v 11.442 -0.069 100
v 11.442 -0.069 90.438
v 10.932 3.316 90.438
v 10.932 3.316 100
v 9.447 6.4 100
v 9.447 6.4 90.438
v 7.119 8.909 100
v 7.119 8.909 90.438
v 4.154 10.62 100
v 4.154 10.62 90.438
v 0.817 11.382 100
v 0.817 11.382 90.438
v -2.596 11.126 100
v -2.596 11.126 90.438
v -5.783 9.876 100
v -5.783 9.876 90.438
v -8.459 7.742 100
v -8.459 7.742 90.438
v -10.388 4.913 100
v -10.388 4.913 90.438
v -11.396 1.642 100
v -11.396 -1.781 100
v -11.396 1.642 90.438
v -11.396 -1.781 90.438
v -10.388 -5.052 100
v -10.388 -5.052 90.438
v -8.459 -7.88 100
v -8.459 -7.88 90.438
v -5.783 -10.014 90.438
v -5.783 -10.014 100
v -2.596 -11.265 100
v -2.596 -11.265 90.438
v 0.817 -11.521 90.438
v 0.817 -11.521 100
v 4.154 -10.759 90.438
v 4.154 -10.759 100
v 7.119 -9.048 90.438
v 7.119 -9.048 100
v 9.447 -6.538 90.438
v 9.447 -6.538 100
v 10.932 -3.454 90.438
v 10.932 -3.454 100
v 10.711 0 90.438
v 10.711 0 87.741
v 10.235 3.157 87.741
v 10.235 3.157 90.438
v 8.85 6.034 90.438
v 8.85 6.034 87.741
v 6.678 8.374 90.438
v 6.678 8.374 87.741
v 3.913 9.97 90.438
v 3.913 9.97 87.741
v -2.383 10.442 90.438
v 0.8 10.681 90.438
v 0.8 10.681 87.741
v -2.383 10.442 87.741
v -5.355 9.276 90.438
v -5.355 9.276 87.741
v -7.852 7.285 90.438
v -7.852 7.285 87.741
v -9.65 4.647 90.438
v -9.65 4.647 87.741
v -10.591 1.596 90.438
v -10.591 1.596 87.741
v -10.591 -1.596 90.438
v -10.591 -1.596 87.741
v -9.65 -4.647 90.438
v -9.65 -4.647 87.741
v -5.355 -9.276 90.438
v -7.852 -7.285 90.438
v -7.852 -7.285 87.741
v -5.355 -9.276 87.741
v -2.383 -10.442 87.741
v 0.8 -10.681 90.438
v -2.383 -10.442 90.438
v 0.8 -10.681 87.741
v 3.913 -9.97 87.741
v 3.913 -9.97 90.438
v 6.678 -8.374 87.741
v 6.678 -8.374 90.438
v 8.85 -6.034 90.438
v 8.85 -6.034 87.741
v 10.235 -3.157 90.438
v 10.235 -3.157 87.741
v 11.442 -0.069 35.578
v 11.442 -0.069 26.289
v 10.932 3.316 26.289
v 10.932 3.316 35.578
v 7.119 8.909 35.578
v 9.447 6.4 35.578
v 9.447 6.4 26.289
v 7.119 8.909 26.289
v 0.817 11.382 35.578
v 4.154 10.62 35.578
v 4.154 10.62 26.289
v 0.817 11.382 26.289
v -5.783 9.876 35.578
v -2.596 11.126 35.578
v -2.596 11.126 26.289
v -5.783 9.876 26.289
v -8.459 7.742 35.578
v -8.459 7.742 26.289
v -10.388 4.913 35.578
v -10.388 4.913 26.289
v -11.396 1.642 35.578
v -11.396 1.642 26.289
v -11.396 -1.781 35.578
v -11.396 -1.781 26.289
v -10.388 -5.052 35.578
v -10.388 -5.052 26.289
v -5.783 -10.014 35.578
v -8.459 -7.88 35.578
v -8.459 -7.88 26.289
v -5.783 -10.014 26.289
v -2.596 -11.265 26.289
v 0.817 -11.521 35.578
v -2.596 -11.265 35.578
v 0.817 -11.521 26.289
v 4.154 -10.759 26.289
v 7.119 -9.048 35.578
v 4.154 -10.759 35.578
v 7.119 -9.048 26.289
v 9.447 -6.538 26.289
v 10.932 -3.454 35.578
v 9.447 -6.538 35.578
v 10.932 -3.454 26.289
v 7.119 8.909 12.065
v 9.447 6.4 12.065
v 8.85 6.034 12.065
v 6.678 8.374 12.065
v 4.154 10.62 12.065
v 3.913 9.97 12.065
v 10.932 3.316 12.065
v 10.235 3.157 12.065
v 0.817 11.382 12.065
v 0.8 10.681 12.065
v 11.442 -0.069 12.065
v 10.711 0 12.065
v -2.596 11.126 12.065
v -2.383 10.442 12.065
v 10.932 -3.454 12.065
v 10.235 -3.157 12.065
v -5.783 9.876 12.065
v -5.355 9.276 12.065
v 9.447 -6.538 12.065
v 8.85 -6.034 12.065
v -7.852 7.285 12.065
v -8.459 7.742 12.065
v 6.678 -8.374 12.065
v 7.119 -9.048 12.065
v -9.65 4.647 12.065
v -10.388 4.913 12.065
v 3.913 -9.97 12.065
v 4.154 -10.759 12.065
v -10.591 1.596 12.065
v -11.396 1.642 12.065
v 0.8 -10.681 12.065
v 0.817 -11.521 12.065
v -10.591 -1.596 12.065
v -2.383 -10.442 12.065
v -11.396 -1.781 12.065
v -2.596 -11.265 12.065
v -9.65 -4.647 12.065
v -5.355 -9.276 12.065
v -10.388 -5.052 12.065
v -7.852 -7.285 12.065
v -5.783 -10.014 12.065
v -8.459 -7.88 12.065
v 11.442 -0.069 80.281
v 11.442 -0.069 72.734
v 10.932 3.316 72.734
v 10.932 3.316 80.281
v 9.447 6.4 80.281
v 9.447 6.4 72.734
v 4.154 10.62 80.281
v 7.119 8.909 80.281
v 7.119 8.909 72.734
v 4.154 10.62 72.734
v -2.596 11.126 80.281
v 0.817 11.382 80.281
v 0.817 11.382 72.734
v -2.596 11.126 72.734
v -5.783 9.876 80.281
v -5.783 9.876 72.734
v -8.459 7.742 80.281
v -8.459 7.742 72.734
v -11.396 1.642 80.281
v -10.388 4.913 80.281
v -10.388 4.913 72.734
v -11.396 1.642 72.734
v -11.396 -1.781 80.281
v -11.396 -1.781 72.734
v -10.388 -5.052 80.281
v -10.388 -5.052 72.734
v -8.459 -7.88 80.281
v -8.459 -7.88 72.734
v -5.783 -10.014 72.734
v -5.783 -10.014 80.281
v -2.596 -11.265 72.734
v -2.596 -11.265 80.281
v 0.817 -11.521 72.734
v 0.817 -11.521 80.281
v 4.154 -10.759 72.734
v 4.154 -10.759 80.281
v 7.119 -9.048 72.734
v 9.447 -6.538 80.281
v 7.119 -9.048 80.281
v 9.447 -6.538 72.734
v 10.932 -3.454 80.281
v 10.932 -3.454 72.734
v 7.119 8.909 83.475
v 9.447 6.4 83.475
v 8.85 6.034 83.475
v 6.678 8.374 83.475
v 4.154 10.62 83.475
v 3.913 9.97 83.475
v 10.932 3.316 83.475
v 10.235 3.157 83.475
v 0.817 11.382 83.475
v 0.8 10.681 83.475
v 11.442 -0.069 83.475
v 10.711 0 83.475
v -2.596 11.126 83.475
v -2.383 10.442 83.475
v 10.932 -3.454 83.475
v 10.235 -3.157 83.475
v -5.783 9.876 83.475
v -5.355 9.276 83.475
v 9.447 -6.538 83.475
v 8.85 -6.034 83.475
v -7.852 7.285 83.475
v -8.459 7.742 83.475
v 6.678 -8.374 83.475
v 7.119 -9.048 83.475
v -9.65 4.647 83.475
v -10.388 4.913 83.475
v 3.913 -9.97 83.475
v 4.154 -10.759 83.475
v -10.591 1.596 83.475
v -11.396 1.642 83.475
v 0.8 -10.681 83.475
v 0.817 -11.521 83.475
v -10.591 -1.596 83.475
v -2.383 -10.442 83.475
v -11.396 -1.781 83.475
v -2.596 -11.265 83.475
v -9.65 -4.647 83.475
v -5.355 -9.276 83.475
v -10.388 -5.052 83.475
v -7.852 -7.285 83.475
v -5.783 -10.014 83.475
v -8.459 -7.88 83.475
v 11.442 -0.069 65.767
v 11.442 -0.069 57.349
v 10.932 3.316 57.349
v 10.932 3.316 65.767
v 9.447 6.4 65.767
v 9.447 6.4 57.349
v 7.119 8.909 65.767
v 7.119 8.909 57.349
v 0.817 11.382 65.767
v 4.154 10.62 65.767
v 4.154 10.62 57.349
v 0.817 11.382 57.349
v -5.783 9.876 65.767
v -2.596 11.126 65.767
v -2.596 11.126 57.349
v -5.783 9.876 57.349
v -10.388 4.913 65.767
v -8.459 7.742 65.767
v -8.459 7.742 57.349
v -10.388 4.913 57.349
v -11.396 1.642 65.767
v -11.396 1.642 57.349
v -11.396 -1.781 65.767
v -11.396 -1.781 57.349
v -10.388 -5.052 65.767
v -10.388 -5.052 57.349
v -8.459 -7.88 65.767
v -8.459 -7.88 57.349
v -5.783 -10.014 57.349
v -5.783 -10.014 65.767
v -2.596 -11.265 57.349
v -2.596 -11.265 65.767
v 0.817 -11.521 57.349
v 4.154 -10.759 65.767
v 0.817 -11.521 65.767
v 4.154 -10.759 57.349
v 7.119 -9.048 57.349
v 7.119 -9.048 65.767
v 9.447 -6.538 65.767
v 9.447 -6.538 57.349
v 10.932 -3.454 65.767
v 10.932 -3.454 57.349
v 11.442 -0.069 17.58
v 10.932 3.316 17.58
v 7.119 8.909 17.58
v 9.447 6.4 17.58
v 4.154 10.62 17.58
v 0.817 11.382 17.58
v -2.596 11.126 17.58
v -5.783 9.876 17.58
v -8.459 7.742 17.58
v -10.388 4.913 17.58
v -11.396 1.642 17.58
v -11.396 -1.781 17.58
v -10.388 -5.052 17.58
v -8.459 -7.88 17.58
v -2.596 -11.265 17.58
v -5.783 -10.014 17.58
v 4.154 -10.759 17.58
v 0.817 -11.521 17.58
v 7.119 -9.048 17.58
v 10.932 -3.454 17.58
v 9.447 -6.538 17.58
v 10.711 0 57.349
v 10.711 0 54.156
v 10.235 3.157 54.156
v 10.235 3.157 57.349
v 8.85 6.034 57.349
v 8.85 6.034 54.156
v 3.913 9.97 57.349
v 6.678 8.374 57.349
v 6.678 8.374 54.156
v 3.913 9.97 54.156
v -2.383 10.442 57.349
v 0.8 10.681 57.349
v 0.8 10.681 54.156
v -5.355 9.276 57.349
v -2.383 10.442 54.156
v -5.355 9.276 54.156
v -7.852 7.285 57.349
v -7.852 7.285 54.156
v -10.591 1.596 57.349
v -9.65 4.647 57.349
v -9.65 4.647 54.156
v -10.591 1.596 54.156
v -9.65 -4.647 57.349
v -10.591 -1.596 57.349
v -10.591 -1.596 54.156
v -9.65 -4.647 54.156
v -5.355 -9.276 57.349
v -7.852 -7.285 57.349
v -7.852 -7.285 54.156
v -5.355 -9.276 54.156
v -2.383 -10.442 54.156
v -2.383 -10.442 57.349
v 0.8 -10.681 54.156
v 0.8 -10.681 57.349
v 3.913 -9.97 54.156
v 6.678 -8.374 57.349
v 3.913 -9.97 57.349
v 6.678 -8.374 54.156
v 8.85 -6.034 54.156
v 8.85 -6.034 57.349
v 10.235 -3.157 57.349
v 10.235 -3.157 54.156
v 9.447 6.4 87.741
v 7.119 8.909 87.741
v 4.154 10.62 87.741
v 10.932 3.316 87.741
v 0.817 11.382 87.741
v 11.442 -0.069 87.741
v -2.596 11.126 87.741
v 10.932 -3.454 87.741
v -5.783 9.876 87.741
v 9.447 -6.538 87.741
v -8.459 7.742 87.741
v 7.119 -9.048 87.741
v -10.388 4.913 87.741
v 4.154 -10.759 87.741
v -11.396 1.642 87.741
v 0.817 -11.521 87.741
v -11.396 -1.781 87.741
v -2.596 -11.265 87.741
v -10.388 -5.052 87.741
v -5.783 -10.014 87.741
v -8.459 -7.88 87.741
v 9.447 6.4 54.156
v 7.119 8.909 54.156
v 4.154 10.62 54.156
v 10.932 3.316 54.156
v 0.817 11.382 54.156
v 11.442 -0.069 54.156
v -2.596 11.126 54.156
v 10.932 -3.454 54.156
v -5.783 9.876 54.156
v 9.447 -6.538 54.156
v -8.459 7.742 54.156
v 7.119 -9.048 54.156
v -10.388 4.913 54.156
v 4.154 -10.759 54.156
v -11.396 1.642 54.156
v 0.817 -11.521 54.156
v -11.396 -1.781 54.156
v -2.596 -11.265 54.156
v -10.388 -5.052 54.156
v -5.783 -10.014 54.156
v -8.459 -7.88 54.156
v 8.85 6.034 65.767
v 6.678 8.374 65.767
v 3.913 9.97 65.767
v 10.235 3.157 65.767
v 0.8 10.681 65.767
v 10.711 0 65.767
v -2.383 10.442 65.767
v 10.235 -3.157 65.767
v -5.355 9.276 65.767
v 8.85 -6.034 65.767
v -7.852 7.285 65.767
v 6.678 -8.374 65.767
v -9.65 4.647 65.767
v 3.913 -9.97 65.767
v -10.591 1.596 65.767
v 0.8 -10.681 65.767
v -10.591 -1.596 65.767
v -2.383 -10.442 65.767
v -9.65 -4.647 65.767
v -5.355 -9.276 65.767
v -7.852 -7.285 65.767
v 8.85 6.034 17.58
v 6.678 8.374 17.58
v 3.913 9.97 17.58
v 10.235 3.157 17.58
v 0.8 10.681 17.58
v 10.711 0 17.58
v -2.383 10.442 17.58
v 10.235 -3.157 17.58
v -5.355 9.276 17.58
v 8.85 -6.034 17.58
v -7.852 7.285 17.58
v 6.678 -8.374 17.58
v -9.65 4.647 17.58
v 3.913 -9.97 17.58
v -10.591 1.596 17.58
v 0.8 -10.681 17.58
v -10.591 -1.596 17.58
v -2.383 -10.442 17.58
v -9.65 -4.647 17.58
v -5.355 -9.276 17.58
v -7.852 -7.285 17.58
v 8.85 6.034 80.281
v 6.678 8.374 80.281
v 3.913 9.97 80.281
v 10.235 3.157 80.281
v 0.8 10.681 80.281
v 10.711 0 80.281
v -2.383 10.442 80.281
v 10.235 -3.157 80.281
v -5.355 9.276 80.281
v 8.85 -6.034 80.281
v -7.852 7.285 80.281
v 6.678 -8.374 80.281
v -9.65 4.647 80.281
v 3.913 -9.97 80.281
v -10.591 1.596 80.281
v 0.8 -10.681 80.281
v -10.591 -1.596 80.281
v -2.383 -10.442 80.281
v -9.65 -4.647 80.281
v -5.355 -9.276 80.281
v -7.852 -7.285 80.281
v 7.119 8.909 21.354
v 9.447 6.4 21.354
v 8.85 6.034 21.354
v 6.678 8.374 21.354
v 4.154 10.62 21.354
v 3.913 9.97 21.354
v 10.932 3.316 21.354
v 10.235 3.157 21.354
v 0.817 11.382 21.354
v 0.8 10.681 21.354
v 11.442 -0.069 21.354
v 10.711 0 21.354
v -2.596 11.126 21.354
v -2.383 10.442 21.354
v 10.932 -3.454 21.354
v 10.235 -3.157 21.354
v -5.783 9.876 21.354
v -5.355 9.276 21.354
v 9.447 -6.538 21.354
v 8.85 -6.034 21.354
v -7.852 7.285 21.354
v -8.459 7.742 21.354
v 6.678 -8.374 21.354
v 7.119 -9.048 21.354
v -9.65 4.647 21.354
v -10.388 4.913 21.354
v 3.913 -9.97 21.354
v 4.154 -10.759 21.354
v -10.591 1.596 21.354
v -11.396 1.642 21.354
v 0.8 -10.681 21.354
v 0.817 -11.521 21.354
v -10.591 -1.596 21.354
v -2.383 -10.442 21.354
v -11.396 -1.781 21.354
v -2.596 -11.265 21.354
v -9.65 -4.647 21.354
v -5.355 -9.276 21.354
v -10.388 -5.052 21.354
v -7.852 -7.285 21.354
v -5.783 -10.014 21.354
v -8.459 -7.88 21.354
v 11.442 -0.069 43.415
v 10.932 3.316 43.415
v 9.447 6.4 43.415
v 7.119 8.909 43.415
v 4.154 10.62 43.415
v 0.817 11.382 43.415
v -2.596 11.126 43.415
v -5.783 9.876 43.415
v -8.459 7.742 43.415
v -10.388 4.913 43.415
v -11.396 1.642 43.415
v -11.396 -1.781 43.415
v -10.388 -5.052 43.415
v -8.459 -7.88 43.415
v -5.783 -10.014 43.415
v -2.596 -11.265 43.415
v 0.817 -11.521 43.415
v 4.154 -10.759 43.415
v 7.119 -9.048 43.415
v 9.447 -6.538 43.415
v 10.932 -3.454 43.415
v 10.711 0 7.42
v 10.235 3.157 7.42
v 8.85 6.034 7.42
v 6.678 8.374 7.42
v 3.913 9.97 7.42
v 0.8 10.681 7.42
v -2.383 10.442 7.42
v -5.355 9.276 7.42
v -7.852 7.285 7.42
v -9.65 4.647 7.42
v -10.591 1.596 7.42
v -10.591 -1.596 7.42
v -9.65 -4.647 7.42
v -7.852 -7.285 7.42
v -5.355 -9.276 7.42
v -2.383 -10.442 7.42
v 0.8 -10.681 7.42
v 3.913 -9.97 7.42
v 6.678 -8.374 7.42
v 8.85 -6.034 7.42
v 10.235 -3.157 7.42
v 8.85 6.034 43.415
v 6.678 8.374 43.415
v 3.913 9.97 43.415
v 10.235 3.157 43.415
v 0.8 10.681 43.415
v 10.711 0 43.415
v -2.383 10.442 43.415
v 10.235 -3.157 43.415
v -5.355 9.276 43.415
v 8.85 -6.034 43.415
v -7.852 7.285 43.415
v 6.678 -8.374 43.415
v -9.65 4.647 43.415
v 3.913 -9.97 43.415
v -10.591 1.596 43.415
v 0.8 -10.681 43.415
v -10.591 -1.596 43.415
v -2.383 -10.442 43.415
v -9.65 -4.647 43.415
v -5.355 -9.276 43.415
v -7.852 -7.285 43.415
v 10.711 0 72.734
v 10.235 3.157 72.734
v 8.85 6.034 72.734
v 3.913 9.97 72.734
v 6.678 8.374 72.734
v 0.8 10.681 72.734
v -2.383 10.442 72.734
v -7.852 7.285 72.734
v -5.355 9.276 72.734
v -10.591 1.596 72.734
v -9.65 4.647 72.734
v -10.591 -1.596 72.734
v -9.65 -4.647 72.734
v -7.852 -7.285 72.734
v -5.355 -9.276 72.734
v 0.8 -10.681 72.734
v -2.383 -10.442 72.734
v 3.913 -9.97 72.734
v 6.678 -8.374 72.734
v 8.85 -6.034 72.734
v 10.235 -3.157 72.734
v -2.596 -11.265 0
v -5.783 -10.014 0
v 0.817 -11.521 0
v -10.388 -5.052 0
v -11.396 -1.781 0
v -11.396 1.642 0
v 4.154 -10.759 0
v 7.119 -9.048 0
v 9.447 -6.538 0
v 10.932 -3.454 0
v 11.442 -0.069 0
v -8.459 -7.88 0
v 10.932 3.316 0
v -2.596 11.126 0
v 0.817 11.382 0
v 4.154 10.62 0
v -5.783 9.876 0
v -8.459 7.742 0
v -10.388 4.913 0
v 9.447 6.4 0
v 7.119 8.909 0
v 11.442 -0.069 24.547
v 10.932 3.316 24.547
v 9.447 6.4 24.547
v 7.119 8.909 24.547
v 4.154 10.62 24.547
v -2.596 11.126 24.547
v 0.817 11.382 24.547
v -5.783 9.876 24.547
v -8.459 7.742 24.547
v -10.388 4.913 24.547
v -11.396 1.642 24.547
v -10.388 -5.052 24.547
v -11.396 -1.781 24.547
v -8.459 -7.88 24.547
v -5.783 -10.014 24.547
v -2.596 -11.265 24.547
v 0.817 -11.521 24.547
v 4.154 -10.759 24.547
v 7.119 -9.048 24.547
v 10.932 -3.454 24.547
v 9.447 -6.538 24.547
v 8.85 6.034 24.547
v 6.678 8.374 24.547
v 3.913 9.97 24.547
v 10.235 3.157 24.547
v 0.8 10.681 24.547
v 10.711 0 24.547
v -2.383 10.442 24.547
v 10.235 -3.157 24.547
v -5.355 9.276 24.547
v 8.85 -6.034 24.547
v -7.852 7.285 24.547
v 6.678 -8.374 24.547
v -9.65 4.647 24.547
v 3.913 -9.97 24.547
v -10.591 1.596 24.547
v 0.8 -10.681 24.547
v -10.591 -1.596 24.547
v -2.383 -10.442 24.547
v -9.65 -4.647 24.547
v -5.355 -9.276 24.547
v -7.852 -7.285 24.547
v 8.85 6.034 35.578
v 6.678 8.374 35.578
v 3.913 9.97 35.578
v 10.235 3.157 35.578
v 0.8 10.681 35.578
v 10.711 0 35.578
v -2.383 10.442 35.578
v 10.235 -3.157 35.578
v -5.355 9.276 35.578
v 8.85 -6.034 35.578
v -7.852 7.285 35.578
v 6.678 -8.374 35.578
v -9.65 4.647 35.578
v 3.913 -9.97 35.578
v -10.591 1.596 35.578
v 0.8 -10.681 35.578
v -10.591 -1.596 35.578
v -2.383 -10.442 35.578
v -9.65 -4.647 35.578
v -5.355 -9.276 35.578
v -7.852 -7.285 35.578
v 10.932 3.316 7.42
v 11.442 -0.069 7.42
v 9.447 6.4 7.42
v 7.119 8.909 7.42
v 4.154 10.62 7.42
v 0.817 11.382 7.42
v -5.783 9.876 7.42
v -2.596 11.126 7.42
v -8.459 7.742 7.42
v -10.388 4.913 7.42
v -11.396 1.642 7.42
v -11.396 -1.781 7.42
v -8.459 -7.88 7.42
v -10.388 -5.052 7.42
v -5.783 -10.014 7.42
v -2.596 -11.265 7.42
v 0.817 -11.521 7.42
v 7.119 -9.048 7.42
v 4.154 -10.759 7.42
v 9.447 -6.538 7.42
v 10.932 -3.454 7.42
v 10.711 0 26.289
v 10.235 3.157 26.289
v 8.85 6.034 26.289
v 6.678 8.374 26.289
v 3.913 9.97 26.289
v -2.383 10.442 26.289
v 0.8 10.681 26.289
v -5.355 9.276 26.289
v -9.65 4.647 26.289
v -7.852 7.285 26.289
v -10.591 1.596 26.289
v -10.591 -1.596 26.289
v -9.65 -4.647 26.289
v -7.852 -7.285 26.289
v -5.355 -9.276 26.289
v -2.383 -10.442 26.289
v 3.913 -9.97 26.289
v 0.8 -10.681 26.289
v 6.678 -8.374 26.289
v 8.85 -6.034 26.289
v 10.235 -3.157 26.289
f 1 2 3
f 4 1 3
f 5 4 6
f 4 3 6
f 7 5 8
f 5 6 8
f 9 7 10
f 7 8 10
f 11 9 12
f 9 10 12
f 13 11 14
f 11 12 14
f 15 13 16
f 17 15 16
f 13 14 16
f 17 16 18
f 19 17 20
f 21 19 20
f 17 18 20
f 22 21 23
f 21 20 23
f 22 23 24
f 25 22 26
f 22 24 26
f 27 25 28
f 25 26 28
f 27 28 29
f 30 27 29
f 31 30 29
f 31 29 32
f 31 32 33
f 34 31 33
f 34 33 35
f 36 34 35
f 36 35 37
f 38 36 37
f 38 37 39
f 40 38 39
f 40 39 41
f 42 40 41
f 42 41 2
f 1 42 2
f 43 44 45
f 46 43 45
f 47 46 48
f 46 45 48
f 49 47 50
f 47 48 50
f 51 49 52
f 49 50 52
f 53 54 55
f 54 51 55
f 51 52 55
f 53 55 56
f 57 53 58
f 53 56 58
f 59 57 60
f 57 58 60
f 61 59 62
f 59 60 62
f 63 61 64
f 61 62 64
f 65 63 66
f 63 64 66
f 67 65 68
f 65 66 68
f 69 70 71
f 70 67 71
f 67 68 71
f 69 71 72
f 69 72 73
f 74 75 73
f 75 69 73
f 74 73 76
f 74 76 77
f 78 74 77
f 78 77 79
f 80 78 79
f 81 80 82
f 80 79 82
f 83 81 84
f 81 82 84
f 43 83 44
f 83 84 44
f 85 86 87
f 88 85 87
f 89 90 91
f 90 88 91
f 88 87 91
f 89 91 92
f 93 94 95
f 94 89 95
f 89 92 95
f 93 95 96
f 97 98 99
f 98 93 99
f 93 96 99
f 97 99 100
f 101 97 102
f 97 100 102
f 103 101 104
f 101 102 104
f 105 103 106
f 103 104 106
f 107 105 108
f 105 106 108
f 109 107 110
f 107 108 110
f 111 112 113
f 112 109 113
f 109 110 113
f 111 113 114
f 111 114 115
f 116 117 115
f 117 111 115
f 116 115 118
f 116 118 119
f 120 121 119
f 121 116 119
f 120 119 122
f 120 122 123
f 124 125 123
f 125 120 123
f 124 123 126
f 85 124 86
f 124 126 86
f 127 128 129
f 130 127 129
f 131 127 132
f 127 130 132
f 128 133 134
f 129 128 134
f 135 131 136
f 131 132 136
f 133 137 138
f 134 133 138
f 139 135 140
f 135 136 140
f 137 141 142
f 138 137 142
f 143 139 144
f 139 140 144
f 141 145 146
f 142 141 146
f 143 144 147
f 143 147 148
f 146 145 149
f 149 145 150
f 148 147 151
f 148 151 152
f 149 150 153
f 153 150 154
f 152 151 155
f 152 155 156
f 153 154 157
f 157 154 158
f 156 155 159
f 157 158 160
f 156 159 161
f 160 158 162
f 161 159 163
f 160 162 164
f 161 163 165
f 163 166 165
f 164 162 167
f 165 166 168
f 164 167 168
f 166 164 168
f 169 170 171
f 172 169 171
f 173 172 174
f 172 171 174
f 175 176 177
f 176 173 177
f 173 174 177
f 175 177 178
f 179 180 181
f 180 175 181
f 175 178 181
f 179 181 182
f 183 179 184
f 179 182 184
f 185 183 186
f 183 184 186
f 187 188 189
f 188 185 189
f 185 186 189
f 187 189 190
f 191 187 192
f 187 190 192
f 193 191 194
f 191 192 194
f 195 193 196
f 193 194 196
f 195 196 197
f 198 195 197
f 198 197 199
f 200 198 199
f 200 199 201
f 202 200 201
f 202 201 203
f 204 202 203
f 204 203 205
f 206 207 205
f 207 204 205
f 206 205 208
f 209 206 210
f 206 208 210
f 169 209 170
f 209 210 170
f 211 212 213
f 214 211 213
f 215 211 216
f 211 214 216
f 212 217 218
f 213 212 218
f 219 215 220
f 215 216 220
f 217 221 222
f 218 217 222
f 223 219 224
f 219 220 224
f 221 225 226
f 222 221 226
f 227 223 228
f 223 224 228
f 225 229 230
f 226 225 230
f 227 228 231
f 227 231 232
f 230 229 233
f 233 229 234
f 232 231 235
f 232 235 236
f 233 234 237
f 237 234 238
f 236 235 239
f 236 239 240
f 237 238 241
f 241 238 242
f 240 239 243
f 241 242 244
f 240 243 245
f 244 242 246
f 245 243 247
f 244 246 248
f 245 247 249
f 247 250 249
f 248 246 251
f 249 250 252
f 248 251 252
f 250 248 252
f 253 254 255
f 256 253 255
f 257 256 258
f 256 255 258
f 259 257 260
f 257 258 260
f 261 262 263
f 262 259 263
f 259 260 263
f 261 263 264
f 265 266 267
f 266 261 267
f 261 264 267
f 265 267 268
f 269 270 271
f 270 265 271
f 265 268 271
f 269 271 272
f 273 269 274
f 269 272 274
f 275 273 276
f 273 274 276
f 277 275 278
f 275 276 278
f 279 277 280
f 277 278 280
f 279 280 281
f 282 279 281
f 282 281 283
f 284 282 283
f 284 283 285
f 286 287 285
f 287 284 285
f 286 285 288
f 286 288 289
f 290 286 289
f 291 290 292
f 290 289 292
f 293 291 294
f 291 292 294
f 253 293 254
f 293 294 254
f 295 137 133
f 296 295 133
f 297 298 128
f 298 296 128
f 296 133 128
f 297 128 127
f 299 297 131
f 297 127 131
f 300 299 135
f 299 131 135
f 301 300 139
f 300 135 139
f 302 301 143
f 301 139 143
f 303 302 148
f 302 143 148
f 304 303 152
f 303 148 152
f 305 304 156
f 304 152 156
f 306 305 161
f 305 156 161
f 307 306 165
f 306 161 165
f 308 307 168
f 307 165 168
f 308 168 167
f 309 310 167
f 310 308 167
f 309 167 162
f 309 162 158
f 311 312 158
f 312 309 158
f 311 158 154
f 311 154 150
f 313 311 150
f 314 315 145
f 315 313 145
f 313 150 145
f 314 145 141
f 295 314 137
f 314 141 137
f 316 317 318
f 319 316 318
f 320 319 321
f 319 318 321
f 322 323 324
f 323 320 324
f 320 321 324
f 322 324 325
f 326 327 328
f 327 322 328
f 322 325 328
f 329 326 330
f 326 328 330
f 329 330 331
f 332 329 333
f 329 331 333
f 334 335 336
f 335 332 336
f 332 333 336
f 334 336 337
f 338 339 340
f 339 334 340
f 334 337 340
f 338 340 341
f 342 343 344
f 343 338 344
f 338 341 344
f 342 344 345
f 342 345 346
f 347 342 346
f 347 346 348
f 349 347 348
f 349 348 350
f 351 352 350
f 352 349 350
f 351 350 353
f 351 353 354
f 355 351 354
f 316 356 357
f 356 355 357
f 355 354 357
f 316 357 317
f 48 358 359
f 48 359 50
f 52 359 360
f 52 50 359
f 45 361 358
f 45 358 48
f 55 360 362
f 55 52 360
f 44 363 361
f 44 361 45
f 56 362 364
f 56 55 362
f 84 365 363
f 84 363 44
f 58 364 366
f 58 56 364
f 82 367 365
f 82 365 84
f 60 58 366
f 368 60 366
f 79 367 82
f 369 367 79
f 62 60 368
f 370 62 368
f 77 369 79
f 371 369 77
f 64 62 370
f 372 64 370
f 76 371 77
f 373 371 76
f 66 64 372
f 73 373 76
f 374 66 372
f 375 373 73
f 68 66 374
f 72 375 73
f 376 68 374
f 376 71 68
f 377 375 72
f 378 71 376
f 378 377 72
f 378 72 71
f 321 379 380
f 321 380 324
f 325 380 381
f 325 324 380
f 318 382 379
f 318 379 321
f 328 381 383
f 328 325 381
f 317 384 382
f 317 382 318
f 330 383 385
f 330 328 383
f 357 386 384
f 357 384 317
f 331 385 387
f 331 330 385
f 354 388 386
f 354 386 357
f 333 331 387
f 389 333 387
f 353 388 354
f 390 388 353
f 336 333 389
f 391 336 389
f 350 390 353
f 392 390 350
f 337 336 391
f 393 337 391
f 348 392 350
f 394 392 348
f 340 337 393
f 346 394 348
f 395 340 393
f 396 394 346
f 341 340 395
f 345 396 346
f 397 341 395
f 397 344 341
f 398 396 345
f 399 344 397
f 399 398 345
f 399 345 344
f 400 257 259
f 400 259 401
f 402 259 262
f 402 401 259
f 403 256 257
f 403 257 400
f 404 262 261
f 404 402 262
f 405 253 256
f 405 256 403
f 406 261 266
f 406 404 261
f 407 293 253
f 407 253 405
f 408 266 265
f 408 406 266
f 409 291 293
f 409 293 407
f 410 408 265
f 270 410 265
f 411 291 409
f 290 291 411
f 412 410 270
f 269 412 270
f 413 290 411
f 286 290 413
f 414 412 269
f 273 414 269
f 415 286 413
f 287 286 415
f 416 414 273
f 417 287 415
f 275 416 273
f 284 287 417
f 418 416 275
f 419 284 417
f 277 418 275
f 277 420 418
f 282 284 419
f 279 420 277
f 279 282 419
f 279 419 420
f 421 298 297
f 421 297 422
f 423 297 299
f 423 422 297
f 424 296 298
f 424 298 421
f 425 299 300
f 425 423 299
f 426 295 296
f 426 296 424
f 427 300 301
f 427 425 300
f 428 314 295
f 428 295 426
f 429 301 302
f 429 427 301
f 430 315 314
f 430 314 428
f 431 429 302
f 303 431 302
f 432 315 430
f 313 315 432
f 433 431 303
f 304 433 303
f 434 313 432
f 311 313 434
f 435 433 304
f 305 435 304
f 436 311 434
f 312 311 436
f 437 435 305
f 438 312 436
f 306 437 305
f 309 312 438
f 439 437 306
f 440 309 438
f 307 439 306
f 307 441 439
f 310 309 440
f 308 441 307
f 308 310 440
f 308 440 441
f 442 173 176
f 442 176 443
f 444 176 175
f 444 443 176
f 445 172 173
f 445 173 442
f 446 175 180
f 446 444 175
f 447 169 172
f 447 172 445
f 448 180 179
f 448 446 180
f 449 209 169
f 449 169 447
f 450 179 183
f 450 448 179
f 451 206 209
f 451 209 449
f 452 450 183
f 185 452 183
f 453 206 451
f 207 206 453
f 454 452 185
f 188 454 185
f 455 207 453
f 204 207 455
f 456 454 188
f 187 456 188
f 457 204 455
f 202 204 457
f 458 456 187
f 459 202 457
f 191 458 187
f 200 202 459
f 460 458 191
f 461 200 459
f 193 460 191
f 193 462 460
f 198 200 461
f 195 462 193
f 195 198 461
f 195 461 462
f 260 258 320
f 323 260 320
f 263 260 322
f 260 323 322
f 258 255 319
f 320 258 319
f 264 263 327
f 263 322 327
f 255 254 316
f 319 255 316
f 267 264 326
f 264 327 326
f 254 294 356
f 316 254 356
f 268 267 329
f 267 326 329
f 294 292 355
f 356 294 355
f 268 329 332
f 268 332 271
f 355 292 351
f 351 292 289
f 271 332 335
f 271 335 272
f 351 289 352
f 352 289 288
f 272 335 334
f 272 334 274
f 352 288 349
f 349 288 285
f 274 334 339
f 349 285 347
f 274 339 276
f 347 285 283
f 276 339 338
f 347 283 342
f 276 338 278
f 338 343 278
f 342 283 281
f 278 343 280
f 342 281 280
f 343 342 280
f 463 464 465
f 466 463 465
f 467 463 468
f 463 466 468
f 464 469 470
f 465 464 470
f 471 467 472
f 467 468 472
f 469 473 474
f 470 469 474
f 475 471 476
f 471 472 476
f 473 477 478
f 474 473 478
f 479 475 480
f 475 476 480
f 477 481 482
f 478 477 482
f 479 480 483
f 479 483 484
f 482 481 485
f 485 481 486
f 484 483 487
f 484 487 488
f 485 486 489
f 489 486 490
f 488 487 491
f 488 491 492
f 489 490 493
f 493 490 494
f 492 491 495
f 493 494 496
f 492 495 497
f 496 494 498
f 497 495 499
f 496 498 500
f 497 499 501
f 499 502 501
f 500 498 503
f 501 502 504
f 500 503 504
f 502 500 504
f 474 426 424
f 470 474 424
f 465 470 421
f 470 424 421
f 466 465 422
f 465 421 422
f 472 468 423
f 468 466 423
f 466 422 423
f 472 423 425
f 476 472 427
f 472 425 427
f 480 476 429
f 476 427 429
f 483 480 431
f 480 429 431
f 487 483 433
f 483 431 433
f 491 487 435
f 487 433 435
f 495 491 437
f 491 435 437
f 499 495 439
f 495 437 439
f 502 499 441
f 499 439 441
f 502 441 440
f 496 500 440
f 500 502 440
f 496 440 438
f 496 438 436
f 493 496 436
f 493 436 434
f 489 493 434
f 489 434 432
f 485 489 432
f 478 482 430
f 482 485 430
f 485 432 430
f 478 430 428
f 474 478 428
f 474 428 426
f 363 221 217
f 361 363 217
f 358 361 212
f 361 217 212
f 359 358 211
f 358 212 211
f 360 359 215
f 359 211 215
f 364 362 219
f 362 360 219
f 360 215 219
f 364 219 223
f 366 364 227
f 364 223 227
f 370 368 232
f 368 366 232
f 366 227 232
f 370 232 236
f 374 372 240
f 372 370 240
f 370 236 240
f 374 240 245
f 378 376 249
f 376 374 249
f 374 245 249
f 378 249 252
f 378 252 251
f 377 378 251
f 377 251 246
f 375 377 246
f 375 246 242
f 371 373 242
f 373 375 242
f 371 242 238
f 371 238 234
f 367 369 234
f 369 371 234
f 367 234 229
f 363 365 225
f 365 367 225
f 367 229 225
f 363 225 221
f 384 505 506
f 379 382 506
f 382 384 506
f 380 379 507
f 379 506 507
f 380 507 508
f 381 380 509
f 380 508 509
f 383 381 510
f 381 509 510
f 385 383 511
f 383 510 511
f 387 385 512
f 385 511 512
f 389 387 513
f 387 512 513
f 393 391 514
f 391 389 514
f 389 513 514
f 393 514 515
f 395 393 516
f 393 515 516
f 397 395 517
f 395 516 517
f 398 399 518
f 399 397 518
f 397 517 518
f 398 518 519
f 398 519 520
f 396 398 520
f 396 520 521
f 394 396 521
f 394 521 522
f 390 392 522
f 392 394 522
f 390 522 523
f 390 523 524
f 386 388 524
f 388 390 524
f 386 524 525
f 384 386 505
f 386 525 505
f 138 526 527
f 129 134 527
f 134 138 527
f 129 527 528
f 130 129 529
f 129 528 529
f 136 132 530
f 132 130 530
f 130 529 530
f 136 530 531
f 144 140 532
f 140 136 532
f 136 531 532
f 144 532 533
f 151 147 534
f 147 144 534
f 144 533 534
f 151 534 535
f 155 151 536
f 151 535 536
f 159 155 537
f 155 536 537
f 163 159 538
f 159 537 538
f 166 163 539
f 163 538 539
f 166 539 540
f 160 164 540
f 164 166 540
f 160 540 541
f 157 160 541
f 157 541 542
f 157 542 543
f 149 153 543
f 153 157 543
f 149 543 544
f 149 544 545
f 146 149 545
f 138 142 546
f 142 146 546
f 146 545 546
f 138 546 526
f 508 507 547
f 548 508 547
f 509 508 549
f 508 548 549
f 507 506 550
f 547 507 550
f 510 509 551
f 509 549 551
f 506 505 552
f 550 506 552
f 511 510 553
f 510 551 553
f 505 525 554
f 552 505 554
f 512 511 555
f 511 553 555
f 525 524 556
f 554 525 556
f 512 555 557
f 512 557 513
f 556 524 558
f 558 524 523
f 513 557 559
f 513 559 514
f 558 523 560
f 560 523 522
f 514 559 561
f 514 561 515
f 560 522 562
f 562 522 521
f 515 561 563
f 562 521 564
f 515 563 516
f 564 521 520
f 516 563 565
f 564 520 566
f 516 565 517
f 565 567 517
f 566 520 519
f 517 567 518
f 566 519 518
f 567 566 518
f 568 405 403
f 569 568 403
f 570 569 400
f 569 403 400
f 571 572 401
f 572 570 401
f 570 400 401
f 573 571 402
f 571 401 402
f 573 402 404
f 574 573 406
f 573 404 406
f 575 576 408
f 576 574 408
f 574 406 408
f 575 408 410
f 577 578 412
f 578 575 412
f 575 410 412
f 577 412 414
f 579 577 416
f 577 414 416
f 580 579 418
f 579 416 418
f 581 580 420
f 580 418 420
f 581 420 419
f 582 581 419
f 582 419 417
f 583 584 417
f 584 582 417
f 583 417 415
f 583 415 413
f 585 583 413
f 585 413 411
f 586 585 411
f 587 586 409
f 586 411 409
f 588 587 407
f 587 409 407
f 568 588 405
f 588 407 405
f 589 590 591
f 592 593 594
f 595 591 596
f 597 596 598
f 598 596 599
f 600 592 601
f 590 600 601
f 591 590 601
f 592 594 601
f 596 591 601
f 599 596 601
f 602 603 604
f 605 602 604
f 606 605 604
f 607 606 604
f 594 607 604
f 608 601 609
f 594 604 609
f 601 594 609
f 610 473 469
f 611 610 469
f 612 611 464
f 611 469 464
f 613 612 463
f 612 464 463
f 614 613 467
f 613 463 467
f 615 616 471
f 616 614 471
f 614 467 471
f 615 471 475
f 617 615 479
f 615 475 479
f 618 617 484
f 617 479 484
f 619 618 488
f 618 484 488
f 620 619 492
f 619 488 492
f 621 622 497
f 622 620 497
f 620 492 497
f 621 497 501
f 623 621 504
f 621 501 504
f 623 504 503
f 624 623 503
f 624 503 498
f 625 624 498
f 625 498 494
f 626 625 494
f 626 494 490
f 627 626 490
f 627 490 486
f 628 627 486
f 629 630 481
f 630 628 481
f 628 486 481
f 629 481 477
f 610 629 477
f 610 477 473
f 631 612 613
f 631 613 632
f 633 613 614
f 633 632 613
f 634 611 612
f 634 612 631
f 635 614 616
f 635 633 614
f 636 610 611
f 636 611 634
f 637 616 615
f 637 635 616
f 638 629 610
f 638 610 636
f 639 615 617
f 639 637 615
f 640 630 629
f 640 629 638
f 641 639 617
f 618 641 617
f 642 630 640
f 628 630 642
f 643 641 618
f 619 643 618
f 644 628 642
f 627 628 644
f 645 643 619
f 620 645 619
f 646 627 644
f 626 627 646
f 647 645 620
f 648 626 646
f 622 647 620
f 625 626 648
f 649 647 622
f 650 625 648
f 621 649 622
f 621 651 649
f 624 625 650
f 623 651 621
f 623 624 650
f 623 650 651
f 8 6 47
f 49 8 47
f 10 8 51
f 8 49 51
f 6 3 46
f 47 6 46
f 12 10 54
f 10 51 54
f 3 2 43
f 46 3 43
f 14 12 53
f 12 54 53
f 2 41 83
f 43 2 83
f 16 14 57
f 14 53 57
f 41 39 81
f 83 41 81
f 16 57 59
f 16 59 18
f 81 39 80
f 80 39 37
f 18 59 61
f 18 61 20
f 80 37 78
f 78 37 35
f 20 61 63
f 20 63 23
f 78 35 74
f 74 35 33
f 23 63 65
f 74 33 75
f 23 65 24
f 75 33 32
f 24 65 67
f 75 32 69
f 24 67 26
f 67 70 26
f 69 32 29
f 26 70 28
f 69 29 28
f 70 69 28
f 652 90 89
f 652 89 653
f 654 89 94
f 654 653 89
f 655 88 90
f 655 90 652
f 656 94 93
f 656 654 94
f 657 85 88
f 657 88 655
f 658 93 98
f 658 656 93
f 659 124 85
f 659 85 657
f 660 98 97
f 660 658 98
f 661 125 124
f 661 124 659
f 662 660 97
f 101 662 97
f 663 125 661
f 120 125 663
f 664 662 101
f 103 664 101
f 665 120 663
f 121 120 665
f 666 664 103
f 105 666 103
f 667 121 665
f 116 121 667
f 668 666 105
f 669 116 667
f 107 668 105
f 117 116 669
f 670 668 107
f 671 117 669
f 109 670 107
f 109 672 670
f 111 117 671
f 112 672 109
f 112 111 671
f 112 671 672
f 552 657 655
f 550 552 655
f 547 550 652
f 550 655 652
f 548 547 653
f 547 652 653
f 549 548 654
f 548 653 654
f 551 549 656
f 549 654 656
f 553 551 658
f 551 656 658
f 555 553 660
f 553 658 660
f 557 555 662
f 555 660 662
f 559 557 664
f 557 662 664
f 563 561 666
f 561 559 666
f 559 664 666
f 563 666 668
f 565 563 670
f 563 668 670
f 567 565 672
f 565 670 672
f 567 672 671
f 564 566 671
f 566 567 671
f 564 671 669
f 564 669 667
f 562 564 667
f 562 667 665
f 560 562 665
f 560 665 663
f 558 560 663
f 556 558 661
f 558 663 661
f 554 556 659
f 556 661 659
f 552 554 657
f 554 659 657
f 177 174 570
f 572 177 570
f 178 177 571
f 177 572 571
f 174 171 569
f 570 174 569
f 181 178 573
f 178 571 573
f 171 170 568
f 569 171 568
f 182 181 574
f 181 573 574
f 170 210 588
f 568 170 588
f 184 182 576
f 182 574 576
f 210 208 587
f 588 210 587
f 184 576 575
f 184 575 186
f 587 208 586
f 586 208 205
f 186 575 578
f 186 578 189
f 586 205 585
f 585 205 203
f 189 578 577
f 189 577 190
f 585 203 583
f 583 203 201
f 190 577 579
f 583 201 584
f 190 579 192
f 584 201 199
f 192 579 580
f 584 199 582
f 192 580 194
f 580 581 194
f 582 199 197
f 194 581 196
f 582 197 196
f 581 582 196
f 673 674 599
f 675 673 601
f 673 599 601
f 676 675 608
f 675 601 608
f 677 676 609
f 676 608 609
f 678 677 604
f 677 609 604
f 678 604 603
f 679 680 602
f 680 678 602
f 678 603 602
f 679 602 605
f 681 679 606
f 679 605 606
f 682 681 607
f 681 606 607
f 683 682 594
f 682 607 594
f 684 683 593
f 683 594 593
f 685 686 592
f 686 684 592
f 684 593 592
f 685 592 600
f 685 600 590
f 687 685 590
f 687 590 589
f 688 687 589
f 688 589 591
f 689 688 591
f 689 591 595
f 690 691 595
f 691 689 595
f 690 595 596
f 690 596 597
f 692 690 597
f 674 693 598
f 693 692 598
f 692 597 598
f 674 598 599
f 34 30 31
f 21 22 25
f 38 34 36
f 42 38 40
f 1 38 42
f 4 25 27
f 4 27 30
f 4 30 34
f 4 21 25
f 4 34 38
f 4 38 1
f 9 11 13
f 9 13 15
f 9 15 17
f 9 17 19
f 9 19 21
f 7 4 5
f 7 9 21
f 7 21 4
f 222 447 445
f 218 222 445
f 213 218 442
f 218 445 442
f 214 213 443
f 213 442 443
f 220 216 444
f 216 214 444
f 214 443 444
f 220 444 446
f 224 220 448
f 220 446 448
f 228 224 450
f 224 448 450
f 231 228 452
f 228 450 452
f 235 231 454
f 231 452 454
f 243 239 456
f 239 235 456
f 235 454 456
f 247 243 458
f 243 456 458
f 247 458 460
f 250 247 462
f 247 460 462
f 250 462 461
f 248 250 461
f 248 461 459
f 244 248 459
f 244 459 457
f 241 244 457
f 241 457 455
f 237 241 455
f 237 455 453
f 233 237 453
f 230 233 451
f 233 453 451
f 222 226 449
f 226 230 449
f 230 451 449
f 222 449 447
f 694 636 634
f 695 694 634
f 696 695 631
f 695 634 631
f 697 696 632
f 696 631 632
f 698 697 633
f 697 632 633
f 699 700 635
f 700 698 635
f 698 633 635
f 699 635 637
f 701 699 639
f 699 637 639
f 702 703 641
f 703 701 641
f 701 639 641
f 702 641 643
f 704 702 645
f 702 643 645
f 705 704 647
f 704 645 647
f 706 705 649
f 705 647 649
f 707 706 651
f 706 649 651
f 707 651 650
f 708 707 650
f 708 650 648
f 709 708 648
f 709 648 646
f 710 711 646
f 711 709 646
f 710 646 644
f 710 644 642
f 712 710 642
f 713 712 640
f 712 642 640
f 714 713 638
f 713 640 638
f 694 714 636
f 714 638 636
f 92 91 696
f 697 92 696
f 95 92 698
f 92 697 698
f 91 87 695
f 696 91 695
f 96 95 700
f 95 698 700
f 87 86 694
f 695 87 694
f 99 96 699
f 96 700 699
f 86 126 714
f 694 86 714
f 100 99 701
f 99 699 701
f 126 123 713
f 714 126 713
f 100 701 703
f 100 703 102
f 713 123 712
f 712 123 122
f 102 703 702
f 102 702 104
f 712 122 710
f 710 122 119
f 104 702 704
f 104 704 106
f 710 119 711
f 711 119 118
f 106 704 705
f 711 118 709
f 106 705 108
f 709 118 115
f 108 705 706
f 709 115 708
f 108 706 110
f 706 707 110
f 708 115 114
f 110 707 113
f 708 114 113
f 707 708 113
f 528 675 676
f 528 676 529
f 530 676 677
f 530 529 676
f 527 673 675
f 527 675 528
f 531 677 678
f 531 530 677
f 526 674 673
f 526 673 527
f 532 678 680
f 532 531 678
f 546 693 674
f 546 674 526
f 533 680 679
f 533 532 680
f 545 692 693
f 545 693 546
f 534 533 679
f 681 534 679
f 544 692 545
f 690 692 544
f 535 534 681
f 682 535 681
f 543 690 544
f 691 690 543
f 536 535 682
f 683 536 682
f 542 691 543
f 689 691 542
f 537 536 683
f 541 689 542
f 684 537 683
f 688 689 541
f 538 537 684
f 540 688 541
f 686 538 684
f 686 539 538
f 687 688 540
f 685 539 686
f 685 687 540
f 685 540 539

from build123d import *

# Parameters (mm, degrees)
F0_R     = 11.4835992145
F0_R_2   = 10.7107701276
F1_DEPTH = 100
F2_W     = 32.8816715628
F2_H     = 2.6963576674
F2_W_2   = 32.8778307885
F2_H_2   = 3.1931251287
F2_W_3   = 32.5816031545
F2_H_3   = 6.9668218493
F2_W_4   = 32.9470410943
F2_H_4   = 3.193128854
F2_W_5   = 29.896620661
F2_H_5   = 7.8376792371
F2_H_6   = 1.7417054623
F2_W_6   = 27.0034540445
F2_H_7   = 3.7736967206
F2_W_7   = 26.4959204942
F2_H_8   = 4.6445494518
F4_DEPTH = 100


# Not quite as in the source:
# - a feature names something its author has since deleted; it is built from what else it names


with BuildPart() as f1:
    # F0 (on Top) → F1 (new body)
    with BuildSketch(Plane.XY):
        with Locations((-0.0411355359, -0.0693021866)):
            Circle(F0_R)
        Circle(F0_R_2, mode=Mode.SUBTRACT)
    extrude(amount=F1_DEPTH)

    # F2 (on Front) → F3 (revolve, cut)
    with BuildSketch(Plane.XZ):
        with Locations((-16.4408357814, 89.0894643962)):
            Rectangle(F2_W, F2_H)
        with Locations((-16.4389153942, 81.8779617548)):
            Rectangle(F2_W_2, F2_H_2)
        with Locations((-16.2908015773, 69.2505948246)):
            Rectangle(F2_W_3, F2_H_3)
        with Locations((-16.4735205472, 55.7523723692)):
            Rectangle(F2_W_4, F2_H_4)
        with Locations((-14.9483103305, 39.4964460284)):
            Rectangle(F2_W_5, F2_H_5)
        with Locations((-14.9483103305, 25.4176529124)):
            Rectangle(F2_W_5, F2_H_6)
        with Locations((-13.5017270222, 19.4668248296)):
            Rectangle(F2_W_6, F2_H_7)
        with Locations((-13.2479602471, 9.7422976978)):
            Rectangle(F2_W_7, F2_H_8)
    revolve(axis=Axis((0, 0, 49.8652271926), (0, 0, 1)), mode=Mode.SUBTRACT)

    # F0 (on Top) → F4 (join)
    with BuildSketch(Plane.XY):
        Circle(F0_R_2)
    extrude(amount=F4_DEPTH)


solid = f1.part
